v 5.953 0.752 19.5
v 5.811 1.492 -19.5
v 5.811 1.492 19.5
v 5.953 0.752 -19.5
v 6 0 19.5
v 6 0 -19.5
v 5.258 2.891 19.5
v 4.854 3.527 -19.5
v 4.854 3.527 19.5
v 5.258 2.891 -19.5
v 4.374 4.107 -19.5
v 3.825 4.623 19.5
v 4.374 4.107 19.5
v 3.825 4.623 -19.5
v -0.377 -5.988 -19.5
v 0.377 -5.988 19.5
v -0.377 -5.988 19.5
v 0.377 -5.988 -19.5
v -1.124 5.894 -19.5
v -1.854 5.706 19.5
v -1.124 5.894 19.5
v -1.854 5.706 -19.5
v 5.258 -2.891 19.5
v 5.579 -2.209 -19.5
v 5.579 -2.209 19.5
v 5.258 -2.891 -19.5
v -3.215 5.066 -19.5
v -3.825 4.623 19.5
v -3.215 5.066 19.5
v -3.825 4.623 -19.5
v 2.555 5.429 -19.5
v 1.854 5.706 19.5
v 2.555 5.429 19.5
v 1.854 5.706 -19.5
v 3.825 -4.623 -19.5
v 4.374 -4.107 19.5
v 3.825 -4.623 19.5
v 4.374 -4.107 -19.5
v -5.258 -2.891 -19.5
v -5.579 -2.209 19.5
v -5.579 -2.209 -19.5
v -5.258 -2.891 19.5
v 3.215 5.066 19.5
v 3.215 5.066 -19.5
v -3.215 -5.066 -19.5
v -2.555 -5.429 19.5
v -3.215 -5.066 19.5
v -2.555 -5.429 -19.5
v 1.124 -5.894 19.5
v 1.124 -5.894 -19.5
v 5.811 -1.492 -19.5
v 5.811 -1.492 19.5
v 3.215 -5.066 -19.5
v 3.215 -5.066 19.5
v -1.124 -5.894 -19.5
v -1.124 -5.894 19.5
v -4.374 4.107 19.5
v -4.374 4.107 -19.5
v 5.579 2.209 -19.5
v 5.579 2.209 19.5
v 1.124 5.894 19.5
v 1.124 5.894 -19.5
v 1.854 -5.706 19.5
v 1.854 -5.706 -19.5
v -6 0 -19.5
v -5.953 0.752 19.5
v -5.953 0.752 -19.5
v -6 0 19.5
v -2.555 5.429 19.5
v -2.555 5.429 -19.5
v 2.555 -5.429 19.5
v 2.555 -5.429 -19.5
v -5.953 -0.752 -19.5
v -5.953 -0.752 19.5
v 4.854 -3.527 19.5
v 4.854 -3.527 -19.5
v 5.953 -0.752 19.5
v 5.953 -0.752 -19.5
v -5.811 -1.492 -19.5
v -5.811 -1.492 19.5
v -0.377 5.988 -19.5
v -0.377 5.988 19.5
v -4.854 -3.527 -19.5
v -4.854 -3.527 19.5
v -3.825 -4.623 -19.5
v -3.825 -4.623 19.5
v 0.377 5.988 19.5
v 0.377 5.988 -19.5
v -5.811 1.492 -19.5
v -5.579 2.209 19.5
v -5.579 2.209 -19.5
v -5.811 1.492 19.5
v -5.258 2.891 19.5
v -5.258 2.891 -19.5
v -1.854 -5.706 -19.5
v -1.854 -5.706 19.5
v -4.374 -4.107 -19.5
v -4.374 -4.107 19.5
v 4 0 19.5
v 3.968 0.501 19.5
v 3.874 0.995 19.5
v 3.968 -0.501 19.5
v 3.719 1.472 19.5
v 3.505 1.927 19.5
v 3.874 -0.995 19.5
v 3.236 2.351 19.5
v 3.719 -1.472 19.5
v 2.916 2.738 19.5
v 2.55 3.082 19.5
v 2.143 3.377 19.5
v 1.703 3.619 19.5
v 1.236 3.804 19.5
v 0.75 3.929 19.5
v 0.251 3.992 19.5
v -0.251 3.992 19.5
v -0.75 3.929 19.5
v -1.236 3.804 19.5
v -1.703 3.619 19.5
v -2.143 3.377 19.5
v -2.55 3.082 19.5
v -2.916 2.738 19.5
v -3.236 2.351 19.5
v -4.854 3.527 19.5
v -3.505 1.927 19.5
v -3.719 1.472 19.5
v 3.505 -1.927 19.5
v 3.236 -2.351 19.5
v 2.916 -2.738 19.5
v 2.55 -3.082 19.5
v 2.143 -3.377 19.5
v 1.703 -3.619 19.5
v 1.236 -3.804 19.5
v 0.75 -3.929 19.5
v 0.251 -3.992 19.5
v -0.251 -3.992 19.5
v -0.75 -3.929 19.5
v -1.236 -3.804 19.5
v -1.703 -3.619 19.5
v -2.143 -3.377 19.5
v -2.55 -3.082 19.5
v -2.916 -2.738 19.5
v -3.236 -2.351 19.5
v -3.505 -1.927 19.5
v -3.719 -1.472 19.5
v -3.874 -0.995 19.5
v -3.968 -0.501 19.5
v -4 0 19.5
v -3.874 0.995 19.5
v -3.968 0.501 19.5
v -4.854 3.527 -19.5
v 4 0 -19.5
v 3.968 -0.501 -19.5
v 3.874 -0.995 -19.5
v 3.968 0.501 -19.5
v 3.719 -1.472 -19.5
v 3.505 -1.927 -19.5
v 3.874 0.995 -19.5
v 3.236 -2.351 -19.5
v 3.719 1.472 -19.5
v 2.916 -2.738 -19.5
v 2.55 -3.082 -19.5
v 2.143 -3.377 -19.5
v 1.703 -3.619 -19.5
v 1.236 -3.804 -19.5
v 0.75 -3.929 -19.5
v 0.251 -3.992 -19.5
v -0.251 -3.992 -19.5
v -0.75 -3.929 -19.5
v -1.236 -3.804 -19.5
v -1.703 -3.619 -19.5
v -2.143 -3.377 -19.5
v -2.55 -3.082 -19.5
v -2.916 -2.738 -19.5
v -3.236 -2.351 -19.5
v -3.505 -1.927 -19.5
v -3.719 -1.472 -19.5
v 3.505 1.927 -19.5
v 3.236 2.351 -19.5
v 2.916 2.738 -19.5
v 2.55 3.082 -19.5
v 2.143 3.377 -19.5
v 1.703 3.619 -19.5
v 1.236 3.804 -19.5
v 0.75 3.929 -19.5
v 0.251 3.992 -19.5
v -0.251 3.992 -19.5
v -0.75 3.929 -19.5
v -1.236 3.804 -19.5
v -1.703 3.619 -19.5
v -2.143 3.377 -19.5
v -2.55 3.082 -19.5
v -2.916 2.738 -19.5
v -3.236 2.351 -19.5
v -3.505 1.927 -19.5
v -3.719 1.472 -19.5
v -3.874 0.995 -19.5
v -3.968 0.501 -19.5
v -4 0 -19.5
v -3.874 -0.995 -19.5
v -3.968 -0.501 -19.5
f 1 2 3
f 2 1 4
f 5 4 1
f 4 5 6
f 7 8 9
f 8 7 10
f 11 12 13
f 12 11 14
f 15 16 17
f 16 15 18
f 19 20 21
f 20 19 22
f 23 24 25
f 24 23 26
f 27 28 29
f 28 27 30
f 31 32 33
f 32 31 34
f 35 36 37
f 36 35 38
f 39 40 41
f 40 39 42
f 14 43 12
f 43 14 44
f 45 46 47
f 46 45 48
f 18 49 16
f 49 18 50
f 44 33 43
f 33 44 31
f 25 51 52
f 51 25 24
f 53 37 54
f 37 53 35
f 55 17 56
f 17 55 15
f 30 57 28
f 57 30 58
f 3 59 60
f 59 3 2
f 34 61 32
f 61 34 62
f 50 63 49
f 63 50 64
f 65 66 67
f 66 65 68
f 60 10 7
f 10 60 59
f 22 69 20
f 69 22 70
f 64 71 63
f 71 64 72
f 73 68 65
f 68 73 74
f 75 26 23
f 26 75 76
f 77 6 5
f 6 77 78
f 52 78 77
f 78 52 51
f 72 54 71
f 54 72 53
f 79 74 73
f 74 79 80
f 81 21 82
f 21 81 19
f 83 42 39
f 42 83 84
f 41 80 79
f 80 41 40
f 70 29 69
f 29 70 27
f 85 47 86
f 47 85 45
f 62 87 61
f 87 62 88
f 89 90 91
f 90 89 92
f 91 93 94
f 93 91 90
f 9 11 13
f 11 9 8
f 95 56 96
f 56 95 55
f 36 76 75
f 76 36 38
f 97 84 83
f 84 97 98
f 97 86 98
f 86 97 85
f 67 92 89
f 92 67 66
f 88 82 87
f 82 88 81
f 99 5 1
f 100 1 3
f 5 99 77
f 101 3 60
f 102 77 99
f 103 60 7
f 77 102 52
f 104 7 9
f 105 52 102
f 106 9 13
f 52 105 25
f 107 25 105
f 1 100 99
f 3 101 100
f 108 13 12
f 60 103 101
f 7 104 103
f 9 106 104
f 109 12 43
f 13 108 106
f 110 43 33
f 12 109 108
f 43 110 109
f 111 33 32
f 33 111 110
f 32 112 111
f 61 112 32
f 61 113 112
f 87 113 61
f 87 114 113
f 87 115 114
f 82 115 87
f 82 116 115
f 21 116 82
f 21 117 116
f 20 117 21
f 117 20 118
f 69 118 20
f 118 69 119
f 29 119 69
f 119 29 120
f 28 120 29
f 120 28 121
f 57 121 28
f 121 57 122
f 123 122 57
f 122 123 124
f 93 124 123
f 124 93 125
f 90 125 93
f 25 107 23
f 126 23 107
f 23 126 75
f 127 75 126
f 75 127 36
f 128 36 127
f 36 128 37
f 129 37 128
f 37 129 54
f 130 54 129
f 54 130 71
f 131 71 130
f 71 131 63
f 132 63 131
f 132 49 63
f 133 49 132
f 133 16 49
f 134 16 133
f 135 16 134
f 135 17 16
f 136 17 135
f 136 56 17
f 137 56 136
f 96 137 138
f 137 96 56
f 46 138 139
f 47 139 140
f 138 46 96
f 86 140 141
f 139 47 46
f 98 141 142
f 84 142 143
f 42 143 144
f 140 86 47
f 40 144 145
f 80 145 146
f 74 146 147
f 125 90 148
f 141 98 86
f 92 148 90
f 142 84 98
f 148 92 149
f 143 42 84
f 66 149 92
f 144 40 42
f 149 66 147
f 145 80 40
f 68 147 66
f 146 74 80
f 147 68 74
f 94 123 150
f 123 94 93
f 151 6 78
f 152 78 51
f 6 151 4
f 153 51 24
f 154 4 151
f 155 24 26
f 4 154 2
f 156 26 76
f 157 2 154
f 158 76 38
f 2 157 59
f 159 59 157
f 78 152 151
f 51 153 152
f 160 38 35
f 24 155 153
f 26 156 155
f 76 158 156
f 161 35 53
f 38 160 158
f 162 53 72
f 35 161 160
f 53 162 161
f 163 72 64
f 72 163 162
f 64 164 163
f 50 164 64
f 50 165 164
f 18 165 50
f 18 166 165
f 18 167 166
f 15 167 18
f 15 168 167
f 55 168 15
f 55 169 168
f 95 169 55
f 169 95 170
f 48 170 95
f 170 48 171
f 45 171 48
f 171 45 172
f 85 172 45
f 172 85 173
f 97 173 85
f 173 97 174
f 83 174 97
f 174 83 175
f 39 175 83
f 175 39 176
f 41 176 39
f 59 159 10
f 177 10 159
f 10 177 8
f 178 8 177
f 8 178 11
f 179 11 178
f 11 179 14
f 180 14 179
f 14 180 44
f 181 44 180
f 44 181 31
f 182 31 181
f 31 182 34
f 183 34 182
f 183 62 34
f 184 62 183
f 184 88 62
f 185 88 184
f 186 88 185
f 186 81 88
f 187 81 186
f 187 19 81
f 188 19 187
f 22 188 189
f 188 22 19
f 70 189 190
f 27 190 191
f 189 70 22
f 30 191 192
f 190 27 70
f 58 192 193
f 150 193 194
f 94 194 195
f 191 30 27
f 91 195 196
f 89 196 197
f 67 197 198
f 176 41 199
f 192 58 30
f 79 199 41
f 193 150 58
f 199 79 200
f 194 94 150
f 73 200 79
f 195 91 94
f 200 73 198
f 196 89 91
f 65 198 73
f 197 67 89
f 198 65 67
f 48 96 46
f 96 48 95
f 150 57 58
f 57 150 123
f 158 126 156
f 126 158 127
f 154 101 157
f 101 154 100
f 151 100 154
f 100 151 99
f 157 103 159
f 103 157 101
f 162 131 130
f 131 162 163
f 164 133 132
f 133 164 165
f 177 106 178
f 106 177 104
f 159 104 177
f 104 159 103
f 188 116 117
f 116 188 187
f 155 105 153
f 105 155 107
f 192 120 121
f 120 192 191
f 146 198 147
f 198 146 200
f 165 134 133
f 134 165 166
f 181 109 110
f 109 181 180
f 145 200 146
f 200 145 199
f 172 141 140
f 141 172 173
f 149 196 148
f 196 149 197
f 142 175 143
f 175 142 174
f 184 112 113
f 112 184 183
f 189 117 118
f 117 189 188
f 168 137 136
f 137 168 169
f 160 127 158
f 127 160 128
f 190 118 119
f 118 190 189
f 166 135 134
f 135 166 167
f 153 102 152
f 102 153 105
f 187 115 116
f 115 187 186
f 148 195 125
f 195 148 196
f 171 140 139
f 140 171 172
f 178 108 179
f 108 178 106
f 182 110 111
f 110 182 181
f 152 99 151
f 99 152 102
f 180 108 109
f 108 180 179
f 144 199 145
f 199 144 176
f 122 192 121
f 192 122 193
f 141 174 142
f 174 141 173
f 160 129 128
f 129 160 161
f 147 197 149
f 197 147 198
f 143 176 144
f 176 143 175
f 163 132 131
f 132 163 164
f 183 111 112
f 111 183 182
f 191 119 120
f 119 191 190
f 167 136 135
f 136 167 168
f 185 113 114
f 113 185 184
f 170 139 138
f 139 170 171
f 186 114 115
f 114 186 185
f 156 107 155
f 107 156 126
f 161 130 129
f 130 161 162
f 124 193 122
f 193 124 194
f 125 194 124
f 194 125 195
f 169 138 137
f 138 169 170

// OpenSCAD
$fn = 50;


difference() {
	union() {
		translate(v = [0, 0, -19.5000000000]) {
			cylinder(h = 39, r = 6.0000000000);
		}
	}
	union() {
		translate(v = [0, 0, -100.0000000000]) {
			cylinder(h = 200, r = 4.0000000000);
		}
	}
}
